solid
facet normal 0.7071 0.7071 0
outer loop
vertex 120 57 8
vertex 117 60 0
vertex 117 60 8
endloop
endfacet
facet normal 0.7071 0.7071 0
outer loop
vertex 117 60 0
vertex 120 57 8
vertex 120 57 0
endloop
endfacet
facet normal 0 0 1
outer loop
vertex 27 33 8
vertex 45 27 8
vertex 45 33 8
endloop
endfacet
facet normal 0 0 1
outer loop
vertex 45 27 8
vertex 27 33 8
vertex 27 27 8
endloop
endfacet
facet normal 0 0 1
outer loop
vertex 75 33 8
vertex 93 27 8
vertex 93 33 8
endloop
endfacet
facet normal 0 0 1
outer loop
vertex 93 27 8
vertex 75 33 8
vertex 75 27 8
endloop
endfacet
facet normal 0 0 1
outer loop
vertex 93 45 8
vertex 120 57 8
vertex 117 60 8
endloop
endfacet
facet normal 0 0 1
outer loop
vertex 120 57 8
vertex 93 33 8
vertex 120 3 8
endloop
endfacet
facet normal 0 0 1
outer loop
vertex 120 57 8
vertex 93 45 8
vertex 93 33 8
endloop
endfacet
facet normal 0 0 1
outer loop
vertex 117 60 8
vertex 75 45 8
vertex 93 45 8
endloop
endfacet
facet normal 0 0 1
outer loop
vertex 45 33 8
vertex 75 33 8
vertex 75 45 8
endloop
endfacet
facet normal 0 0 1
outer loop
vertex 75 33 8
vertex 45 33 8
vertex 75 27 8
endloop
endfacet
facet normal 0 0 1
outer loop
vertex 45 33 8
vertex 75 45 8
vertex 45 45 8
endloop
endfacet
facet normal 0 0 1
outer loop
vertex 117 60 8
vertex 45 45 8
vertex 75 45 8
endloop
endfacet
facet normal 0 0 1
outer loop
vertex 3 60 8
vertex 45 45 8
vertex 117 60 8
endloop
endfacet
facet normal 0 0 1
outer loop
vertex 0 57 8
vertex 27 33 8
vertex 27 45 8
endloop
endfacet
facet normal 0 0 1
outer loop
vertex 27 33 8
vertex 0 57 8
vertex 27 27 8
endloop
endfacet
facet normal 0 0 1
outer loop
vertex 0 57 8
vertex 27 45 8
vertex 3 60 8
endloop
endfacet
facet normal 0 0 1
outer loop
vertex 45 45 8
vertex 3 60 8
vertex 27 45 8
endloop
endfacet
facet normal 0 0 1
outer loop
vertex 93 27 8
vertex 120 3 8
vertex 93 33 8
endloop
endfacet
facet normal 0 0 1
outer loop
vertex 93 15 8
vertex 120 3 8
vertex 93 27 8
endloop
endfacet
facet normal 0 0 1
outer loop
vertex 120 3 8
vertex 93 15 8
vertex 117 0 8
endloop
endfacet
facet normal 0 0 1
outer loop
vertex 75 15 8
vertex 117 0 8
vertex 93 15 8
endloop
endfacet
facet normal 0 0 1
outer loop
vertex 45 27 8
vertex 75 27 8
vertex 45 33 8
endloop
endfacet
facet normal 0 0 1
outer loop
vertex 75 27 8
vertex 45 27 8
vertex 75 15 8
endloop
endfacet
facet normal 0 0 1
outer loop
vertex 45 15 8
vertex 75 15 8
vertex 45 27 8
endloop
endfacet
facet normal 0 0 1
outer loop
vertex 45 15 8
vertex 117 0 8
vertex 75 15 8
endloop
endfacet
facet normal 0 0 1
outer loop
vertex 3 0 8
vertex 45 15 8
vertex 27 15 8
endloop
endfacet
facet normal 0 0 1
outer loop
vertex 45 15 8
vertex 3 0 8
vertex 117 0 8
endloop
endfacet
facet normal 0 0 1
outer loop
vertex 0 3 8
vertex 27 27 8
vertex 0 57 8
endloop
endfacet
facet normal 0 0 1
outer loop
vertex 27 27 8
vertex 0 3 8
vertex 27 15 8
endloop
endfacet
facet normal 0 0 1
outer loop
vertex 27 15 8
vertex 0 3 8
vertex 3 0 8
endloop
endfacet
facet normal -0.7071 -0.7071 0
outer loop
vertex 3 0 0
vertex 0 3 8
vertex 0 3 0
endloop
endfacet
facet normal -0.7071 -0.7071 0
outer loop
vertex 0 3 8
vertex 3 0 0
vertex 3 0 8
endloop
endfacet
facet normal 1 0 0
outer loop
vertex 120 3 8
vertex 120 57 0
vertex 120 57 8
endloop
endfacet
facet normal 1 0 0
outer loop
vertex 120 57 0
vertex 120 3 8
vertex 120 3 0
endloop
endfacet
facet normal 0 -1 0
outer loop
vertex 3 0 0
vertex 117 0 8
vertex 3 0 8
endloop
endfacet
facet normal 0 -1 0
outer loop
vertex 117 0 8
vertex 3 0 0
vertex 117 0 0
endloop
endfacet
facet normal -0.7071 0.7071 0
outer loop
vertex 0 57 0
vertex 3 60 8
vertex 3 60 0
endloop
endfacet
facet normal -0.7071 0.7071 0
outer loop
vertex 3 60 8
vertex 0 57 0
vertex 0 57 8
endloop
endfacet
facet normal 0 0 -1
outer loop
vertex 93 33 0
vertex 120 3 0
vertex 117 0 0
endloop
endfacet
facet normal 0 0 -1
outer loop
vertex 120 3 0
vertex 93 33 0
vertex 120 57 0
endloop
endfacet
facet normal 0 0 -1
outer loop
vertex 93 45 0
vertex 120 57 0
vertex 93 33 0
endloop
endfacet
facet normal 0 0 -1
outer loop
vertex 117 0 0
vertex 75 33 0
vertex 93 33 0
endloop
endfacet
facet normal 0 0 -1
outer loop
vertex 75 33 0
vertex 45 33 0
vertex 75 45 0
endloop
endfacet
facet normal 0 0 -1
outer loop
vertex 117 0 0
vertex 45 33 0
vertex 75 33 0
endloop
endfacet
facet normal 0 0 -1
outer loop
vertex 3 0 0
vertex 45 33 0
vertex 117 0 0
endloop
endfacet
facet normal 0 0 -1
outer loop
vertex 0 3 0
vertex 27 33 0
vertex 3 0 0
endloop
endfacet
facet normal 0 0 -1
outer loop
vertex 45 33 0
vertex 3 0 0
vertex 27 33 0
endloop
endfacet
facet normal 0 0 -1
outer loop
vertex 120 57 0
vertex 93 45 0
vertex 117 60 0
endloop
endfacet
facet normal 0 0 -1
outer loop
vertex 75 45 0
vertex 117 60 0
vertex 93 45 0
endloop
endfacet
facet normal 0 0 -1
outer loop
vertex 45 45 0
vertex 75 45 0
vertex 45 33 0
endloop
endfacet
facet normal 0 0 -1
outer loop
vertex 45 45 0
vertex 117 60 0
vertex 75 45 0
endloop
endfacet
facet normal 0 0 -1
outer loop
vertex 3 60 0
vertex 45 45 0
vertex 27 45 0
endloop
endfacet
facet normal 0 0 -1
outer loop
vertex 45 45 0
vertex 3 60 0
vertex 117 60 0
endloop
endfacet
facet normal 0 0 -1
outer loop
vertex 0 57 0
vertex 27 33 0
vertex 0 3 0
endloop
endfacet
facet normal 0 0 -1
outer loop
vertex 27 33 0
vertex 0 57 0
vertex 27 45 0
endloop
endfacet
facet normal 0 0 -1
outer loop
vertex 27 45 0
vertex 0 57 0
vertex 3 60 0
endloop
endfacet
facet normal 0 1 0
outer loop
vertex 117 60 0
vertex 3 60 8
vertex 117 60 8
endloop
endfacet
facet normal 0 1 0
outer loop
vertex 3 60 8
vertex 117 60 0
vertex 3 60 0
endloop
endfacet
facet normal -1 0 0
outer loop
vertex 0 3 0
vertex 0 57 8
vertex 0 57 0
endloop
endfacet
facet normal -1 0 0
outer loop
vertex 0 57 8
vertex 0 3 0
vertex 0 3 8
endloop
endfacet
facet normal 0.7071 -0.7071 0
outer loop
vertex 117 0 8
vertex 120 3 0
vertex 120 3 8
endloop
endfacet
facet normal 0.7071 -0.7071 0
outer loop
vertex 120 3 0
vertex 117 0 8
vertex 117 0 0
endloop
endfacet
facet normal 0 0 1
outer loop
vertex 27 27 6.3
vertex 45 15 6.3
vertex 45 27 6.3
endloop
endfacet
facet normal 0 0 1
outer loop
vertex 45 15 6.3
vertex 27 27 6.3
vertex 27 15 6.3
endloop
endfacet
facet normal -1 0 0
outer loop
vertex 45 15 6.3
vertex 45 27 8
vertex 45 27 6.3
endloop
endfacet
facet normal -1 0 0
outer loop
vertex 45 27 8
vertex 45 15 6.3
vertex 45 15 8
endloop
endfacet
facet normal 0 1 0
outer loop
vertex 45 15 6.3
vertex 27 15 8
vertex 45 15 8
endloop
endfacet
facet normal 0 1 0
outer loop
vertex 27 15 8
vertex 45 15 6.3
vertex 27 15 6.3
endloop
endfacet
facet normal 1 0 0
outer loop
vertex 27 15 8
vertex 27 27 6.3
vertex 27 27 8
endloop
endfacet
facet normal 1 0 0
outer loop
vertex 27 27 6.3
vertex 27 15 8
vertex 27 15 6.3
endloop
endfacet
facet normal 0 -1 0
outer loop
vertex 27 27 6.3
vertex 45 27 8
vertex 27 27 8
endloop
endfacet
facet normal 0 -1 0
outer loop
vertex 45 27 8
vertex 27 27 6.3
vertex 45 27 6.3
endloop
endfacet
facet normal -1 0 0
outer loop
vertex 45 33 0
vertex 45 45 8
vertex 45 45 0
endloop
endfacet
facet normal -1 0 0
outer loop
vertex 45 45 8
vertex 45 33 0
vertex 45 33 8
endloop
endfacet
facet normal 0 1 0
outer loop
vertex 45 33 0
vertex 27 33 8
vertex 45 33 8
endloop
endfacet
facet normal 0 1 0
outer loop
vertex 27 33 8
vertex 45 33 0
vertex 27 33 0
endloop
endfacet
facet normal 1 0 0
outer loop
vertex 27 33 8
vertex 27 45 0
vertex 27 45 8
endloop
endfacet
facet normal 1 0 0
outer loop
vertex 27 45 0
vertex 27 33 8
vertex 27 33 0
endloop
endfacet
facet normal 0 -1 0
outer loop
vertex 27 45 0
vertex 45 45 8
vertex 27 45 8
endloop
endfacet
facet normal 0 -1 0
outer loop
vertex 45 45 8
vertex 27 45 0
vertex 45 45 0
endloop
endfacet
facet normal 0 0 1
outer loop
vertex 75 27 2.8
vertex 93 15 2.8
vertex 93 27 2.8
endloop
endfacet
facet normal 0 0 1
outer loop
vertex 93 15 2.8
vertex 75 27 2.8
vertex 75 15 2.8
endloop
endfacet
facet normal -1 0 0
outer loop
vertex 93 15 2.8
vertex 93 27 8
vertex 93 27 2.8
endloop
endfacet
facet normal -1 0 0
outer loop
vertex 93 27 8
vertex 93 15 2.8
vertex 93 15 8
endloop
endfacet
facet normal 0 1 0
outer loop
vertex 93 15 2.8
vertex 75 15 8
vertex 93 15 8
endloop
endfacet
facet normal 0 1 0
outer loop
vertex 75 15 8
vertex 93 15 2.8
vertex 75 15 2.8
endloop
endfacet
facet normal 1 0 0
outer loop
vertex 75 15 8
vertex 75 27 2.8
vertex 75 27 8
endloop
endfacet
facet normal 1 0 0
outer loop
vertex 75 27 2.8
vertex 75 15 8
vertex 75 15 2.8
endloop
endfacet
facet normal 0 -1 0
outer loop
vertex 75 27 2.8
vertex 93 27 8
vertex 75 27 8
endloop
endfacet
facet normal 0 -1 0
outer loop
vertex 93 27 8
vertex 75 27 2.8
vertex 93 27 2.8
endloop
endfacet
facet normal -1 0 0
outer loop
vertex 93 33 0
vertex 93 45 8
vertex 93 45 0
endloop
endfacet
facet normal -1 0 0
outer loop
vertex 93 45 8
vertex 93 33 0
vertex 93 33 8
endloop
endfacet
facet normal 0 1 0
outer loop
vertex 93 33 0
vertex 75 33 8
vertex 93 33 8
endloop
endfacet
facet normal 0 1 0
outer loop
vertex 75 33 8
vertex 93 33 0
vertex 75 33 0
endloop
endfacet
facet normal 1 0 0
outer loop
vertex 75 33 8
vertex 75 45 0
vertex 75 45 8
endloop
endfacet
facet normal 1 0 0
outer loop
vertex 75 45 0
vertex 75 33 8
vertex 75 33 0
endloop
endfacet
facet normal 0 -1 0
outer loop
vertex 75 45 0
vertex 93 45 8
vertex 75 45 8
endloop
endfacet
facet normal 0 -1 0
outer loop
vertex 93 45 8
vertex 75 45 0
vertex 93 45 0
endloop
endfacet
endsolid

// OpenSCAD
$fn = 32;

// ----------------------------------------------------------------------
// Windowed plate: 4 voids, 120 x 60 x 8 mm
// ----------------------------------------------------------------------

// --- parameters (mm) ---
plate_l = 120;            // plate length, X
plate_w = 60;             // plate width, Y
plate_t = 8;              // plate thickness, Z
edge_margin = 12;         // wall from the plate edge to any window
win_l = 18;               // pocket length
win_w = 12;               // pocket width
pitch_x = 48;             // grid pitch along X
pitch_y = 18;             // grid pitch along Y
depth_1 = 1.7;            // depth of void 1 (full thickness = through)
depth_2 = 8;              // depth of void 2 (full thickness = through)
depth_3 = 5.2;            // depth of void 3 (full thickness = through)
depth_4 = 8;              // depth of void 4 (full thickness = through)
corner_c = 3;             // corner chamfer of the plate

profile = [[3, 0], [117, 0], [120, 3], [120, 57], [117, 60], [3, 60], [0, 57], [0, 3]];  // primary outline, 8 points, counter clockwise
void_1 = [[27, 15], [45, 15], [45, 27], [27, 27]];  // pocket at grid node 0,0, 4 points
void_2 = [[27, 33], [45, 33], [45, 45], [27, 45]];  // pocket at grid node 0,1, 4 points
void_3 = [[75, 15], [93, 15], [93, 27], [75, 27]];  // pocket at grid node 1,0, 4 points
void_4 = [[75, 33], [93, 33], [93, 45], [75, 45]];  // pocket at grid node 1,1, 4 points

// --- the one profile operation ---
difference() {
  linear_extrude(height = plate_t) polygon(points = profile);
  translate([0, 0, plate_t - depth_1])
    linear_extrude(height = depth_1 + 1) polygon(points = void_1);
  translate([0, 0, -1])
    linear_extrude(height = plate_t + 2) polygon(points = void_2);
  translate([0, 0, plate_t - depth_3])
    linear_extrude(height = depth_3 + 1) polygon(points = void_3);
  translate([0, 0, -1])
    linear_extrude(height = plate_t + 2) polygon(points = void_4);
}
